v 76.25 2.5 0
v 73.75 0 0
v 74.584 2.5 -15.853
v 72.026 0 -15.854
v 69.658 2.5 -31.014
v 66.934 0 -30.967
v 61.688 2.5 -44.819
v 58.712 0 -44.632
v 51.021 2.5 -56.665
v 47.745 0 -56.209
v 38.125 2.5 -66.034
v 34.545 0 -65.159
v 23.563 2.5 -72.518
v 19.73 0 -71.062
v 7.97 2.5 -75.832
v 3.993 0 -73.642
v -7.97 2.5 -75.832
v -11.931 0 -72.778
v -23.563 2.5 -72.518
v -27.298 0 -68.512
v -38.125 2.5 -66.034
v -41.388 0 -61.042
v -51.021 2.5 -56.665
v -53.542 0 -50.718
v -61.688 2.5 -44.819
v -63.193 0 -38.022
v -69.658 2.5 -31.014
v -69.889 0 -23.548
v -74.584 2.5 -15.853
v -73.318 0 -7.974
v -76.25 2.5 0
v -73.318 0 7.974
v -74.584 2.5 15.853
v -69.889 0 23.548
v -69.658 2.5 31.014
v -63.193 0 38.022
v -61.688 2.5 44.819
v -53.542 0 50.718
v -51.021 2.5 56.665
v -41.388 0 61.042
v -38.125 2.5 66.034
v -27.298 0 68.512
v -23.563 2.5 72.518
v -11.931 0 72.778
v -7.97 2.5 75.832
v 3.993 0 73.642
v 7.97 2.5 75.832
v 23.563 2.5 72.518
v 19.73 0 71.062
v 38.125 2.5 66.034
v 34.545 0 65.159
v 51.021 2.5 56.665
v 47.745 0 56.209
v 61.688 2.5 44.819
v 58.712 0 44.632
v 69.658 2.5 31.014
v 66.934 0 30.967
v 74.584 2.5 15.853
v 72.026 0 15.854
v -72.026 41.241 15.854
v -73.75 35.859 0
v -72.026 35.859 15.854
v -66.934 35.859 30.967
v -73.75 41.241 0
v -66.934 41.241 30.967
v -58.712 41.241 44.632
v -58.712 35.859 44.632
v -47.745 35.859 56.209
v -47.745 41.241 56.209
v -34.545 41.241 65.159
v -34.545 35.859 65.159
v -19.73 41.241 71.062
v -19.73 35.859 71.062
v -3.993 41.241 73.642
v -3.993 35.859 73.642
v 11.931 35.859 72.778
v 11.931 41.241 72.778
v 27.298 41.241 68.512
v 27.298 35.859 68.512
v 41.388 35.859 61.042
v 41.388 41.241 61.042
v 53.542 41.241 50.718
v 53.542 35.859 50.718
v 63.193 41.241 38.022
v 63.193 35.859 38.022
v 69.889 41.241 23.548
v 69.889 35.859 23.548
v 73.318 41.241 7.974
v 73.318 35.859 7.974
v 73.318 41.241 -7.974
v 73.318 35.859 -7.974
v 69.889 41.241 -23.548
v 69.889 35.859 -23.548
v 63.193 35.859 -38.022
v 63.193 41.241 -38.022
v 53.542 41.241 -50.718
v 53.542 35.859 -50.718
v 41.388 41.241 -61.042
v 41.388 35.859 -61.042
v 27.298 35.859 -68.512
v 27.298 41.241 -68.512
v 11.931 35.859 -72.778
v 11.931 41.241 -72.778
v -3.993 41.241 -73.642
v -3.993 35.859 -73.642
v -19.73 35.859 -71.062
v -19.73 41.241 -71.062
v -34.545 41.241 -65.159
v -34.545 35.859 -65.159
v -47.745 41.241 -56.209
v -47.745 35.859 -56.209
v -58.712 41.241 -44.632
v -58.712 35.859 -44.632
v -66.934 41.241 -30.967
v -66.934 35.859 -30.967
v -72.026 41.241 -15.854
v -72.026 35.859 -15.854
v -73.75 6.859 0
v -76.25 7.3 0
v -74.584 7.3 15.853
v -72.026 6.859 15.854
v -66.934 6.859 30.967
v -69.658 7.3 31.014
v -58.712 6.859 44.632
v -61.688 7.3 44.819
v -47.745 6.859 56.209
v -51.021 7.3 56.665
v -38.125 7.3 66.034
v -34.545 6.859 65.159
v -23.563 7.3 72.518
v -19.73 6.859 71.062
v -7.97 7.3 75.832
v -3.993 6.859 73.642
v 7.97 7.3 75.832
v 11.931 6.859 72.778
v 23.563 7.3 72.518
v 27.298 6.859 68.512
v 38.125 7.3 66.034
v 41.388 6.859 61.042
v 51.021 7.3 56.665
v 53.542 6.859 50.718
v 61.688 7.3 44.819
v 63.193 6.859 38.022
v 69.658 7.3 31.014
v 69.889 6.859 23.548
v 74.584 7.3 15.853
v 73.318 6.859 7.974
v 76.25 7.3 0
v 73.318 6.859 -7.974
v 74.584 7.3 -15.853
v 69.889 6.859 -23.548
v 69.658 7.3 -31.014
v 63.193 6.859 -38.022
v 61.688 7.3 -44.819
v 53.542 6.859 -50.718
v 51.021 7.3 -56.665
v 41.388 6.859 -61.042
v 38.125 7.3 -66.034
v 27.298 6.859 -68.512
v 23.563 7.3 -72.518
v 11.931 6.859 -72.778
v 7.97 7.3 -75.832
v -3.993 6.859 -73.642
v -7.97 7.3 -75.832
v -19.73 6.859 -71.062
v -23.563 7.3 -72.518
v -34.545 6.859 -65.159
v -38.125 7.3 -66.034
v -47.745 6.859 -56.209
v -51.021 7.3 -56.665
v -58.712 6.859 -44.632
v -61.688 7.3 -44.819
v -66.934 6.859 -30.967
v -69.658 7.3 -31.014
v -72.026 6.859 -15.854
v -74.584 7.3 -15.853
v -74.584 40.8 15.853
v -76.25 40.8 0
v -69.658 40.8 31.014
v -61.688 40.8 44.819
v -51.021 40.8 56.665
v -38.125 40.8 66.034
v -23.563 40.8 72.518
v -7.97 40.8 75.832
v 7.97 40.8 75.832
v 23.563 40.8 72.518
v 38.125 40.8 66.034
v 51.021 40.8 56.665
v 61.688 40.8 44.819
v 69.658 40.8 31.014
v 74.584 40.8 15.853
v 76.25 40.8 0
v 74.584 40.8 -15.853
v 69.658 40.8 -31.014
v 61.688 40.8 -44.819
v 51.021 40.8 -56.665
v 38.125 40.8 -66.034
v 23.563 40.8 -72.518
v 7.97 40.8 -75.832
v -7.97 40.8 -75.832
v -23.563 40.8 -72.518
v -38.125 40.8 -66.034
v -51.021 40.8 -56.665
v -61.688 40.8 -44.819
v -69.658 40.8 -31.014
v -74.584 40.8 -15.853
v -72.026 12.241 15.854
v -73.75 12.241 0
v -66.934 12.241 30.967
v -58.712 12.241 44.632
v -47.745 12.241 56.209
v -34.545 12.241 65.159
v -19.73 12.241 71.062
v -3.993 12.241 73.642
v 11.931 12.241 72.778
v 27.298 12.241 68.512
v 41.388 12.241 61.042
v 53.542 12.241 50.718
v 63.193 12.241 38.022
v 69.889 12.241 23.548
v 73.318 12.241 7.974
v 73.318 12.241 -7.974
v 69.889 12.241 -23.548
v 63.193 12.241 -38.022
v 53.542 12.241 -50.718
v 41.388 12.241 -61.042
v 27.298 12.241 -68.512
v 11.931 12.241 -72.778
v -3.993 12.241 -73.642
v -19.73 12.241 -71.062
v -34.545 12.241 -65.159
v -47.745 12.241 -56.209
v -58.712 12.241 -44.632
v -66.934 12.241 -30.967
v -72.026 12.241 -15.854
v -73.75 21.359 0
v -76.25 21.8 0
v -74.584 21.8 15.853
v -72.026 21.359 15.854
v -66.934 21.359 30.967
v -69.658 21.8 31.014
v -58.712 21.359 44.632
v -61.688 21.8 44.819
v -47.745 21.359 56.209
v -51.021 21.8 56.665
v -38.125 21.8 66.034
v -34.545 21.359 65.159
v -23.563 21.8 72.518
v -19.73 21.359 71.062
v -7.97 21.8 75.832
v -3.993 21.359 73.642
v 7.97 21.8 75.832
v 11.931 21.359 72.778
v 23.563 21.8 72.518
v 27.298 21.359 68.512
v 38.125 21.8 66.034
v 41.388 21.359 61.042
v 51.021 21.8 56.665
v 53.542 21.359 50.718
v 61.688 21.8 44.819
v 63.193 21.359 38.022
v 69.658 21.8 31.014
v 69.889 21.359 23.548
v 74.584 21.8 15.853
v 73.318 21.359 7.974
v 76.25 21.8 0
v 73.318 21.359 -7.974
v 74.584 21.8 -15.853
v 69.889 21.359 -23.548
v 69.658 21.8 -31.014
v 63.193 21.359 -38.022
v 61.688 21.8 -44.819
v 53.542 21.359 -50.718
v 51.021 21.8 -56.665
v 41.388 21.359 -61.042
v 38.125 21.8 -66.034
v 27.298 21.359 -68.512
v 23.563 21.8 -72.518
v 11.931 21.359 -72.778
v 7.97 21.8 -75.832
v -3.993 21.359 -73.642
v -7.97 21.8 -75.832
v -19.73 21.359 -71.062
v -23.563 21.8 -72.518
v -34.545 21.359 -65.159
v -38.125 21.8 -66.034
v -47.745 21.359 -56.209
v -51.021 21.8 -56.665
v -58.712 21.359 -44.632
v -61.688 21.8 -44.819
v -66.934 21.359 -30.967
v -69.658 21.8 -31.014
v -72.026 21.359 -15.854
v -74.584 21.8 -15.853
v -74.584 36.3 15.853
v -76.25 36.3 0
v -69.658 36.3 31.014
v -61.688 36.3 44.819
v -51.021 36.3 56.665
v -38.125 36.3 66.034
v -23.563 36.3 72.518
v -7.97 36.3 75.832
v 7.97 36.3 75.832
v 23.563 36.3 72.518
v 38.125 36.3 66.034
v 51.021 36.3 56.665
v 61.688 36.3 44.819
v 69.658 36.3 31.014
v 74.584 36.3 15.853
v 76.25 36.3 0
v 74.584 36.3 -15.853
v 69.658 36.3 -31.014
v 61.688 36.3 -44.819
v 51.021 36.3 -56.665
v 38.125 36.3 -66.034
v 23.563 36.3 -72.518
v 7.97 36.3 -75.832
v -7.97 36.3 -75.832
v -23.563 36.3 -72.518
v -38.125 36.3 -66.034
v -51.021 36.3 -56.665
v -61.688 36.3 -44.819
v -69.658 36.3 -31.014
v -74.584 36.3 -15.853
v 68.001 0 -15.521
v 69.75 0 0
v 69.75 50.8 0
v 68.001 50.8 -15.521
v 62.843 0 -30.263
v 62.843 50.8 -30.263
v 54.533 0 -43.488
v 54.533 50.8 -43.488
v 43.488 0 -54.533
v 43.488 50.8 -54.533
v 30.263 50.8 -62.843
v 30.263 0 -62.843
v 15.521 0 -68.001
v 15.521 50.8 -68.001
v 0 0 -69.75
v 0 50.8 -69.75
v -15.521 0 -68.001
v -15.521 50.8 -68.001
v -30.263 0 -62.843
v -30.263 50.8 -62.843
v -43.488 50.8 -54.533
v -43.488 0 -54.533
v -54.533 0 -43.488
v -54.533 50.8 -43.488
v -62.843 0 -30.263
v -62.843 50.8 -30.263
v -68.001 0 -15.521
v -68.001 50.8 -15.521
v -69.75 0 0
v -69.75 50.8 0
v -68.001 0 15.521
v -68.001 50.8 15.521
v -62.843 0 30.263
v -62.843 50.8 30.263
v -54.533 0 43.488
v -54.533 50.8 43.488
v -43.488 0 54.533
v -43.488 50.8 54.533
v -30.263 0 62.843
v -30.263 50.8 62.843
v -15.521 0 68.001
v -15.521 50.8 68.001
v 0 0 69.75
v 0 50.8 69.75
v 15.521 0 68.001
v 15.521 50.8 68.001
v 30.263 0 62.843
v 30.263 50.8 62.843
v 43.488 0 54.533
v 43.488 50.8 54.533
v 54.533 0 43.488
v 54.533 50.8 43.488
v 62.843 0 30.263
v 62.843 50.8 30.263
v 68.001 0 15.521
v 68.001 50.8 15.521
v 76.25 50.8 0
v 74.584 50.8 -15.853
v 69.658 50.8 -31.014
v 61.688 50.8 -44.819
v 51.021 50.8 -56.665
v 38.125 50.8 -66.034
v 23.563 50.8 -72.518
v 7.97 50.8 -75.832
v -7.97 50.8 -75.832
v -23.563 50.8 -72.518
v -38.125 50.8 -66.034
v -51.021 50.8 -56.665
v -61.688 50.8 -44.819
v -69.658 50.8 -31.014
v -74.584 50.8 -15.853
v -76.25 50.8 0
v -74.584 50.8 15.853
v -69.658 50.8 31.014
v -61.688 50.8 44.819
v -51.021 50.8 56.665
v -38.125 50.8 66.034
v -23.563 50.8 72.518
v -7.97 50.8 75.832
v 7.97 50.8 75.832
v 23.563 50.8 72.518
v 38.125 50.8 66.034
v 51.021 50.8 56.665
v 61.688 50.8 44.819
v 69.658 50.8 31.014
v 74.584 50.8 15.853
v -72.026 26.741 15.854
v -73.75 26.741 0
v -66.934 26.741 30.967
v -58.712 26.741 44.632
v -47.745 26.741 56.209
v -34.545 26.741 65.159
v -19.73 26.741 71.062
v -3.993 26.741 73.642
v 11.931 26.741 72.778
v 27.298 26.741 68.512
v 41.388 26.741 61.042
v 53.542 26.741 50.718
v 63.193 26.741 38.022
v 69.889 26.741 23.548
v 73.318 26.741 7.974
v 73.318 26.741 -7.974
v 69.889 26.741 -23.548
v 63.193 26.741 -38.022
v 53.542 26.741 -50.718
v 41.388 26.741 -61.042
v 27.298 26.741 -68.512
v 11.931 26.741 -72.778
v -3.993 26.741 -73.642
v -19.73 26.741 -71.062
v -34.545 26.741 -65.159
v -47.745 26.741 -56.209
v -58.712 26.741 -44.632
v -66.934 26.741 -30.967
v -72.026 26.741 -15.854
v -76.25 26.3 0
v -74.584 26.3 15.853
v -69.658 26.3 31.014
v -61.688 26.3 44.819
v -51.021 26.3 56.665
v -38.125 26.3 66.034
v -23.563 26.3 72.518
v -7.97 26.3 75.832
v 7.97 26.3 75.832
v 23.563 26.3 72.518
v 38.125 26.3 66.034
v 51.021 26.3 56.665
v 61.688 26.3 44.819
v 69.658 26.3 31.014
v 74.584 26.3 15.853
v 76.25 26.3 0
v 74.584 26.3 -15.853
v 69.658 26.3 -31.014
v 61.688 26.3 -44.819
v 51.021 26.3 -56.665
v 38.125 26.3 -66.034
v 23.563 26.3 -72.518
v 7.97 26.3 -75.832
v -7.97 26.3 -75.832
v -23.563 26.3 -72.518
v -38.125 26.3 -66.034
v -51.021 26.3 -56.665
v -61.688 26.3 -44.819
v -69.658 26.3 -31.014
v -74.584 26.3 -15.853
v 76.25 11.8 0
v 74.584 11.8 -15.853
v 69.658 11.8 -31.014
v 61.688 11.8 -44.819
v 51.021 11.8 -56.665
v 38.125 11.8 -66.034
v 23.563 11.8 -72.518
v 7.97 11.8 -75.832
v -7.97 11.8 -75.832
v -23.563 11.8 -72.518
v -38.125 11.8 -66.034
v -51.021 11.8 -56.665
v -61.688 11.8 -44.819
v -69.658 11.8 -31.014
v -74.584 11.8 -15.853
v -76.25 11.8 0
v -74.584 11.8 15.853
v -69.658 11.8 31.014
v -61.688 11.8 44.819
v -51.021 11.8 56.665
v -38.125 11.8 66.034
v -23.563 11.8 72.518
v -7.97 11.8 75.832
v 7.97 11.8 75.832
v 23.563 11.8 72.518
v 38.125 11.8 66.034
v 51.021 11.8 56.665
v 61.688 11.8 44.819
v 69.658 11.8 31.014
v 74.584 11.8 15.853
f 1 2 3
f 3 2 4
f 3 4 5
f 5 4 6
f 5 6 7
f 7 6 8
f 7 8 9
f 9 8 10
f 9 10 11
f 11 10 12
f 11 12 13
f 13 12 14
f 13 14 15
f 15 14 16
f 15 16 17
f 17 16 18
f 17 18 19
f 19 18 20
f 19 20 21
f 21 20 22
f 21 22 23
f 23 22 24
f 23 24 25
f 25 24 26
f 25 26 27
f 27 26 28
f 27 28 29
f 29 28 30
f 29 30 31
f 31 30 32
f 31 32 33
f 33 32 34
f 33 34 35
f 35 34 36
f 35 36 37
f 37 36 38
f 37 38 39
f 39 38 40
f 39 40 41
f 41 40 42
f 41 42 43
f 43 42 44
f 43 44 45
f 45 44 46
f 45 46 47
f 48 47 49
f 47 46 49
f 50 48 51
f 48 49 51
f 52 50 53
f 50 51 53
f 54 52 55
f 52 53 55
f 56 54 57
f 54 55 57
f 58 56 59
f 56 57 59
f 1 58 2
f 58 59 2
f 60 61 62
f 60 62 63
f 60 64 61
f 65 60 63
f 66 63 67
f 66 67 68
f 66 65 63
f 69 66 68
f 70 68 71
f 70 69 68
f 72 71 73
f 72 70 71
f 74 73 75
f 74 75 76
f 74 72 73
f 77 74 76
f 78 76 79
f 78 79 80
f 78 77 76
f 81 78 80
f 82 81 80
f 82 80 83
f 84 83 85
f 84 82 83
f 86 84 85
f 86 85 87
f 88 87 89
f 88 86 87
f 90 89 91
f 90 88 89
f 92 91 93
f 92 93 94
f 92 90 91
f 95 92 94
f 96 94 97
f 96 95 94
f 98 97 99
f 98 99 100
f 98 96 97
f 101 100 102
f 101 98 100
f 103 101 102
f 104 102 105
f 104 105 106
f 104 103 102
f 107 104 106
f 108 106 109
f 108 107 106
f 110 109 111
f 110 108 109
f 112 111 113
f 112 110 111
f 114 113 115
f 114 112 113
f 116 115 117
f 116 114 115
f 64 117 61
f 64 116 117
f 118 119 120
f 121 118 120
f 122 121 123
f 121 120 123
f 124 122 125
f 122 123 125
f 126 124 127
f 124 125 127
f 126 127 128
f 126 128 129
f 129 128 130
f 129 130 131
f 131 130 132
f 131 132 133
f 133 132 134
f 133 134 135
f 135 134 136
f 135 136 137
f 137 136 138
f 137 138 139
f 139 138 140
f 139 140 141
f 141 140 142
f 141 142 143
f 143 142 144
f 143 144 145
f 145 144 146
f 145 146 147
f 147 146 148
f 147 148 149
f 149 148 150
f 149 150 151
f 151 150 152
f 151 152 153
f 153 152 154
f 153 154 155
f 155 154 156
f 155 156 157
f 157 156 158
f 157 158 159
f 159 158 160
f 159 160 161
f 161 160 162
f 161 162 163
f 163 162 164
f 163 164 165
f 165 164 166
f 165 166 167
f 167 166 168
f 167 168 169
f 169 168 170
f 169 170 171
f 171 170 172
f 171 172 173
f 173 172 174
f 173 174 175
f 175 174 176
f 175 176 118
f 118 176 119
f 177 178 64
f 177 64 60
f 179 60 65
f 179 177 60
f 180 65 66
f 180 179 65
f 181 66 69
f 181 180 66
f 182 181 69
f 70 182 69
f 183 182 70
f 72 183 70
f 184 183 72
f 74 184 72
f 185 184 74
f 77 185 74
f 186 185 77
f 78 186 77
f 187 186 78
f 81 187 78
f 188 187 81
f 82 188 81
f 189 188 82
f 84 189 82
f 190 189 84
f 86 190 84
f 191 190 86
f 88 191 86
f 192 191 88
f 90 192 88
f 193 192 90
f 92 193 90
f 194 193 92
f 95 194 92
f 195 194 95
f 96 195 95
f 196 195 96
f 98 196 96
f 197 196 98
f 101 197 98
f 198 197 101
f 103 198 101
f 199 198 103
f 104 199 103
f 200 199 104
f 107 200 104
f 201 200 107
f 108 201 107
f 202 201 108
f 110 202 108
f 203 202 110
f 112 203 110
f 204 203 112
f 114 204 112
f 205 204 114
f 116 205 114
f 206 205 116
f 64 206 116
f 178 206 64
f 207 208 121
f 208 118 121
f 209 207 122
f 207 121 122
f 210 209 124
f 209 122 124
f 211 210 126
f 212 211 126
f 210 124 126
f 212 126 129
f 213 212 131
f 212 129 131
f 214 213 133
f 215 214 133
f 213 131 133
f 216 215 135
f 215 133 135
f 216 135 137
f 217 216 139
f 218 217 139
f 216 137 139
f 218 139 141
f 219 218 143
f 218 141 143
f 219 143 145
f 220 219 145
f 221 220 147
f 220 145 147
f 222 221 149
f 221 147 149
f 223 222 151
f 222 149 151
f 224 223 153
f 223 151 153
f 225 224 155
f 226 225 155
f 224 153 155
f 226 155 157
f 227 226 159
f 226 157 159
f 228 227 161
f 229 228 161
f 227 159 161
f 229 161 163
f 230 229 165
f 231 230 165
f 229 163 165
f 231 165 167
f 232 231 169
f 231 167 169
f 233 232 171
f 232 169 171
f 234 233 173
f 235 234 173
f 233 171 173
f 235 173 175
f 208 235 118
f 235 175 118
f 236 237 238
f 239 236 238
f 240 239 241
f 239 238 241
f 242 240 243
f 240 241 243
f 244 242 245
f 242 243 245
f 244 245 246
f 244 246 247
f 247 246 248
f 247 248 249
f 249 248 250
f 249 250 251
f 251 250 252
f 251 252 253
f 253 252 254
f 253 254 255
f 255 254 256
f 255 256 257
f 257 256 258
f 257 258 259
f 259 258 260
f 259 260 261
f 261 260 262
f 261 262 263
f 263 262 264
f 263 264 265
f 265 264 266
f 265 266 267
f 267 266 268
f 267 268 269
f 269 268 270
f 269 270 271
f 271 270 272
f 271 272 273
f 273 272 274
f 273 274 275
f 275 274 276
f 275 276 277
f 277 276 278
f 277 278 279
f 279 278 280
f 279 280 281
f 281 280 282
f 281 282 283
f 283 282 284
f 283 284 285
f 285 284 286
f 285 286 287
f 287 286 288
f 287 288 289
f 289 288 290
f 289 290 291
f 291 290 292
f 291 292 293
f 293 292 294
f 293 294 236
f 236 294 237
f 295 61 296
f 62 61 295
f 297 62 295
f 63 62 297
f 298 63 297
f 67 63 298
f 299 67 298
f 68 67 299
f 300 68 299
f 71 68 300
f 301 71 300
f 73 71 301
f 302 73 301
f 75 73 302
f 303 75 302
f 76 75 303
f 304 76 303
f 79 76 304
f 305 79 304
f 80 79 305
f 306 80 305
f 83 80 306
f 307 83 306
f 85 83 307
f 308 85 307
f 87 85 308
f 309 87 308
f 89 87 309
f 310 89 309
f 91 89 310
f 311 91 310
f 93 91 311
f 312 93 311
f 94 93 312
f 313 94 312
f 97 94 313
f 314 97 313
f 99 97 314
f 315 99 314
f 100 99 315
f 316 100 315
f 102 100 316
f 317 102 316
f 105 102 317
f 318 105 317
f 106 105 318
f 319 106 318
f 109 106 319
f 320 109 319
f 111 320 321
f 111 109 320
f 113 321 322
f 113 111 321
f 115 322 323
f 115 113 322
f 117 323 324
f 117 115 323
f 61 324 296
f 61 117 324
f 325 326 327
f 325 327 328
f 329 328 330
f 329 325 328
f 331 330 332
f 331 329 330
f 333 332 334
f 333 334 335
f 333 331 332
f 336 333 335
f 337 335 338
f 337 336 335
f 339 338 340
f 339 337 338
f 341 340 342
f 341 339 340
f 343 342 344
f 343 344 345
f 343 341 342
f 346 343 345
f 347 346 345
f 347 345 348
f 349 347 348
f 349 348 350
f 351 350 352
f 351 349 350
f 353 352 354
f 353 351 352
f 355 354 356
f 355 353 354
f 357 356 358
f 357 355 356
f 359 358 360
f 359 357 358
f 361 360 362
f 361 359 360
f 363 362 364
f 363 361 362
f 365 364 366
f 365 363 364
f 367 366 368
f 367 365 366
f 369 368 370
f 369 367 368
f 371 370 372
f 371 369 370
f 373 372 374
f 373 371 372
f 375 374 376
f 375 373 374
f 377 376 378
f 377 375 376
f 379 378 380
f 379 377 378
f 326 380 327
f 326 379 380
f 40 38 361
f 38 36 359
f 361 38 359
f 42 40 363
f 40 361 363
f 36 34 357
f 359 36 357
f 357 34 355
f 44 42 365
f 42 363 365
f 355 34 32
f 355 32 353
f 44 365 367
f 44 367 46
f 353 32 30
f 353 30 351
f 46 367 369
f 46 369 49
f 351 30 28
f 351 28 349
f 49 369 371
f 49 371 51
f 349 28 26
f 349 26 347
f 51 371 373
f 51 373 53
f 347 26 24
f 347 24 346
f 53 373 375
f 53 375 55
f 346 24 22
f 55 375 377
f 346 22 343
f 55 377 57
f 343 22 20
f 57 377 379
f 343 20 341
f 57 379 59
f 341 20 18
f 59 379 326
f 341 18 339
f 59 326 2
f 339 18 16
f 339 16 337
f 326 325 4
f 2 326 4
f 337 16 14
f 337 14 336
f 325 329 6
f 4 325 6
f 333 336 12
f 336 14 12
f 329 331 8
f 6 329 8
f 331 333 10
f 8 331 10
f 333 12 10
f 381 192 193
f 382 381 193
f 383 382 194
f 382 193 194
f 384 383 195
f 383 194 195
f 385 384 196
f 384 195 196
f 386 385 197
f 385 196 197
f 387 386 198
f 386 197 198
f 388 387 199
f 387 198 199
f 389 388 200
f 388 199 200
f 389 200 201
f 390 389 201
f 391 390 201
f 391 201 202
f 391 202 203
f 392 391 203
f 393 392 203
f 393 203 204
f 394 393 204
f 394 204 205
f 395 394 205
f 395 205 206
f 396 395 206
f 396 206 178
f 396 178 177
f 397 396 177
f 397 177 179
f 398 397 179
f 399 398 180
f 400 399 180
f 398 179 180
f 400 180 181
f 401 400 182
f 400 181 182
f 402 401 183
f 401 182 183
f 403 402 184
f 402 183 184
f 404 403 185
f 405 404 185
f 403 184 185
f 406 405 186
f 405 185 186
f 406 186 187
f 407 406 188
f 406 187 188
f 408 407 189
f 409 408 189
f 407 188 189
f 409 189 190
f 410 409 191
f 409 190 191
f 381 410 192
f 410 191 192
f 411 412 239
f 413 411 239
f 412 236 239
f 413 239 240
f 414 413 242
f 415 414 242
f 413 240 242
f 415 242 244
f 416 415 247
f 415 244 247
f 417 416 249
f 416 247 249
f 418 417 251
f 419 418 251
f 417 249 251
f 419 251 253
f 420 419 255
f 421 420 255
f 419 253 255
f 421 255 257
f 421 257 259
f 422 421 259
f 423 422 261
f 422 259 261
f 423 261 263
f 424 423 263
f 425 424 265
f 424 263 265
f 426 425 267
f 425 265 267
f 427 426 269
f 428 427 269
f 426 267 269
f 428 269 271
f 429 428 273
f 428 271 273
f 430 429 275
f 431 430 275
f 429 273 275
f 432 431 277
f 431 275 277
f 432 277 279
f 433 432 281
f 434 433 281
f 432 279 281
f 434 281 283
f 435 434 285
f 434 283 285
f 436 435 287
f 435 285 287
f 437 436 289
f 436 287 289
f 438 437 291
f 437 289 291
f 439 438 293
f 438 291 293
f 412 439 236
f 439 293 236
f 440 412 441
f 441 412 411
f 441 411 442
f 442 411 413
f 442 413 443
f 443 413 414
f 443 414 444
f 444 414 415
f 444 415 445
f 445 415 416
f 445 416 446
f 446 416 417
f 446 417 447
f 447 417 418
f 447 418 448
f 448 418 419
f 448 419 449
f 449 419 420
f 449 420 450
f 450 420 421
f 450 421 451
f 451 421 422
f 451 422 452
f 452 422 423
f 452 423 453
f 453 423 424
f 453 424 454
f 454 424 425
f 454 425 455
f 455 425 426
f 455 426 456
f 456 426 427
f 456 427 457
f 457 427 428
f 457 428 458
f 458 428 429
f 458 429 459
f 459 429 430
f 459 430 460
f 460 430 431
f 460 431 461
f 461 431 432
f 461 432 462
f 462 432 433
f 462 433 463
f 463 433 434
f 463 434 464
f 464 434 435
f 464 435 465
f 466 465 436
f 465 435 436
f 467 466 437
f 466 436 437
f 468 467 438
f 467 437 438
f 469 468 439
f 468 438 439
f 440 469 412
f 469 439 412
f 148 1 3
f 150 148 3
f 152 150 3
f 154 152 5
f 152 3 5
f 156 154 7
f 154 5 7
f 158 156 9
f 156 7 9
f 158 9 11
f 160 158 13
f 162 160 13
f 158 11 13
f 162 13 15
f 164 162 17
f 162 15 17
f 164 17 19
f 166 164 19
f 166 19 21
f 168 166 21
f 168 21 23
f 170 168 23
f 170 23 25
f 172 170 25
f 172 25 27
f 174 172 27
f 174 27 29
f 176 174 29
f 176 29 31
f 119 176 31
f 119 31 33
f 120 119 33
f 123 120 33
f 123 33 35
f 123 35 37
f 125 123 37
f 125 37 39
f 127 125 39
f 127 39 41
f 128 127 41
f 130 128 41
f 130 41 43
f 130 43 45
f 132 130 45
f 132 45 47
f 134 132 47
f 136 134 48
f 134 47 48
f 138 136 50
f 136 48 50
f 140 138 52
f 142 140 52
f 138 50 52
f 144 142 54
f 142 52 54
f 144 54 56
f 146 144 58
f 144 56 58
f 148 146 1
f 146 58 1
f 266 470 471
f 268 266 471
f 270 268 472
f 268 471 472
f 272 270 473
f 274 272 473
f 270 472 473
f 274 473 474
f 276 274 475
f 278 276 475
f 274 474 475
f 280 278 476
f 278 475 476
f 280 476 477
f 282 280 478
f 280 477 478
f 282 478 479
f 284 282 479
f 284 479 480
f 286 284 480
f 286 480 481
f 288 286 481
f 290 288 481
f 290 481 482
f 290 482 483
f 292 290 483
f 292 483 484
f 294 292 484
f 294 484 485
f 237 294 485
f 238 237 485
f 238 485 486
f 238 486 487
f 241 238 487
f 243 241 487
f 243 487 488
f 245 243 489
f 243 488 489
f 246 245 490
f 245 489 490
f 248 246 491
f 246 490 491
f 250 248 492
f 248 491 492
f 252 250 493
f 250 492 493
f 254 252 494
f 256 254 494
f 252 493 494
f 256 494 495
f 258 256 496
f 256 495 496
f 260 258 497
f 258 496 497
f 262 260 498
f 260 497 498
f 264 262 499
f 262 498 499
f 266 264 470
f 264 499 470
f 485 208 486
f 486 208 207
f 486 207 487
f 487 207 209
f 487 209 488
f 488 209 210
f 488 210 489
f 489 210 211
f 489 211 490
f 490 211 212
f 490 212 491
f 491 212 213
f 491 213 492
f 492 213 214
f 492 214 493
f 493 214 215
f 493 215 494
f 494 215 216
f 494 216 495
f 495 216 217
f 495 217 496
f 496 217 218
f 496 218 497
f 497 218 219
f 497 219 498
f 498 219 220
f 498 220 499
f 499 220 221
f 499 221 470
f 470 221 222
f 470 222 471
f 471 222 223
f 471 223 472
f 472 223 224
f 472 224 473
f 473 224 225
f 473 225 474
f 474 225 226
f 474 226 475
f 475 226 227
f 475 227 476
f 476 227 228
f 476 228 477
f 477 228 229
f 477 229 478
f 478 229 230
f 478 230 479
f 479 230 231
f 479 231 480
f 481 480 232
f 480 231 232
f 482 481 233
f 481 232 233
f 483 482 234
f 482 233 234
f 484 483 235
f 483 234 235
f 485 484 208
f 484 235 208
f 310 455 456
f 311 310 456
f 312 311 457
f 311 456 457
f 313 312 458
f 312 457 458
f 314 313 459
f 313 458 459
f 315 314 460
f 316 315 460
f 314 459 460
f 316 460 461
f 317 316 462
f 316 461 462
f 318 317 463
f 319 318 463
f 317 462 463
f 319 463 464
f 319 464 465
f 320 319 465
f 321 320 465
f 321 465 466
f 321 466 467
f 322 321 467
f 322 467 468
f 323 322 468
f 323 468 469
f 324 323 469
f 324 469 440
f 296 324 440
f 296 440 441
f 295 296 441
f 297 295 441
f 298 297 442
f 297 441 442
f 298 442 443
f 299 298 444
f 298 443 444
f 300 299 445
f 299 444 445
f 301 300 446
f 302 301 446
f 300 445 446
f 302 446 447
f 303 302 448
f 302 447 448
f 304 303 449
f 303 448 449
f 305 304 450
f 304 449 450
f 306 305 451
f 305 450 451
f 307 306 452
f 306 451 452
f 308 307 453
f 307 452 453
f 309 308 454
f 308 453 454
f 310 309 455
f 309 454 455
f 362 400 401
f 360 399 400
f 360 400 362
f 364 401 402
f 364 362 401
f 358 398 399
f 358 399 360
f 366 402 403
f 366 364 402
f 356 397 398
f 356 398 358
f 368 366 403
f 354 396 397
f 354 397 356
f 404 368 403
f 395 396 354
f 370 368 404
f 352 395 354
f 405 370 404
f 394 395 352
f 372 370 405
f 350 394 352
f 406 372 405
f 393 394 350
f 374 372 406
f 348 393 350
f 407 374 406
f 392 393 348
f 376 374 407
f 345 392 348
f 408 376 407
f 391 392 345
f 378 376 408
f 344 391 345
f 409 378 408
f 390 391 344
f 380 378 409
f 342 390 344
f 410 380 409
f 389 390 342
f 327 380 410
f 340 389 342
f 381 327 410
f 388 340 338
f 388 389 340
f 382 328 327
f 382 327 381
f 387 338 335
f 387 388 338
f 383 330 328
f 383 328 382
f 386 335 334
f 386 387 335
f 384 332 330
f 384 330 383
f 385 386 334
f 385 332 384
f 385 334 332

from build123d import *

# Parameters (mm, degrees)
SKETCH1_R           = 76.25
SKETCH1_R_2         = 69.75
BOSS_EXTRUDE1_DEPTH = 50.8
CHAMFER1_SIZE       = 2.5


with BuildPart() as part:
    # Sketch1 → Boss-Extrude1 (new body)
    with BuildSketch(Plane(origin=(0, 0, 0), x_dir=(1, 0, 0), z_dir=(0, 1, 0))):
        Circle(SKETCH1_R)
        Circle(SKETCH1_R_2, mode=Mode.SUBTRACT)
    extrude(amount=BOSS_EXTRUDE1_DEPTH)

    # Sketch2 → Cut-Revolve1 (revolve, cut)
    with BuildSketch(Plane.XY):
        Polygon((-76.25, 40.8), (-76.25, 36.3), (-73.75, 35.859182548), (-73.75, 41.240817452), align=None)
        Polygon((-73.75, 26.740817452), (-73.75, 21.359182548), (-76.25, 21.8), (-76.25, 26.3), align=None)
        Polygon((-73.75, 12.240817452), (-73.75, 6.859182548), (-76.25, 7.3), (-76.25, 11.8), align=None)
    revolve(axis=Axis((0, 0, 0), (0, 1, 0)), mode=Mode.SUBTRACT)

    # Chamfer1
    chamfer1_edges = [part.edges().sort_by_distance(p)[0] for p in [
        (-76.25, 0, 0),
    ]]
    chamfer(chamfer1_edges, length=CHAMFER1_SIZE)


solid = part.part
